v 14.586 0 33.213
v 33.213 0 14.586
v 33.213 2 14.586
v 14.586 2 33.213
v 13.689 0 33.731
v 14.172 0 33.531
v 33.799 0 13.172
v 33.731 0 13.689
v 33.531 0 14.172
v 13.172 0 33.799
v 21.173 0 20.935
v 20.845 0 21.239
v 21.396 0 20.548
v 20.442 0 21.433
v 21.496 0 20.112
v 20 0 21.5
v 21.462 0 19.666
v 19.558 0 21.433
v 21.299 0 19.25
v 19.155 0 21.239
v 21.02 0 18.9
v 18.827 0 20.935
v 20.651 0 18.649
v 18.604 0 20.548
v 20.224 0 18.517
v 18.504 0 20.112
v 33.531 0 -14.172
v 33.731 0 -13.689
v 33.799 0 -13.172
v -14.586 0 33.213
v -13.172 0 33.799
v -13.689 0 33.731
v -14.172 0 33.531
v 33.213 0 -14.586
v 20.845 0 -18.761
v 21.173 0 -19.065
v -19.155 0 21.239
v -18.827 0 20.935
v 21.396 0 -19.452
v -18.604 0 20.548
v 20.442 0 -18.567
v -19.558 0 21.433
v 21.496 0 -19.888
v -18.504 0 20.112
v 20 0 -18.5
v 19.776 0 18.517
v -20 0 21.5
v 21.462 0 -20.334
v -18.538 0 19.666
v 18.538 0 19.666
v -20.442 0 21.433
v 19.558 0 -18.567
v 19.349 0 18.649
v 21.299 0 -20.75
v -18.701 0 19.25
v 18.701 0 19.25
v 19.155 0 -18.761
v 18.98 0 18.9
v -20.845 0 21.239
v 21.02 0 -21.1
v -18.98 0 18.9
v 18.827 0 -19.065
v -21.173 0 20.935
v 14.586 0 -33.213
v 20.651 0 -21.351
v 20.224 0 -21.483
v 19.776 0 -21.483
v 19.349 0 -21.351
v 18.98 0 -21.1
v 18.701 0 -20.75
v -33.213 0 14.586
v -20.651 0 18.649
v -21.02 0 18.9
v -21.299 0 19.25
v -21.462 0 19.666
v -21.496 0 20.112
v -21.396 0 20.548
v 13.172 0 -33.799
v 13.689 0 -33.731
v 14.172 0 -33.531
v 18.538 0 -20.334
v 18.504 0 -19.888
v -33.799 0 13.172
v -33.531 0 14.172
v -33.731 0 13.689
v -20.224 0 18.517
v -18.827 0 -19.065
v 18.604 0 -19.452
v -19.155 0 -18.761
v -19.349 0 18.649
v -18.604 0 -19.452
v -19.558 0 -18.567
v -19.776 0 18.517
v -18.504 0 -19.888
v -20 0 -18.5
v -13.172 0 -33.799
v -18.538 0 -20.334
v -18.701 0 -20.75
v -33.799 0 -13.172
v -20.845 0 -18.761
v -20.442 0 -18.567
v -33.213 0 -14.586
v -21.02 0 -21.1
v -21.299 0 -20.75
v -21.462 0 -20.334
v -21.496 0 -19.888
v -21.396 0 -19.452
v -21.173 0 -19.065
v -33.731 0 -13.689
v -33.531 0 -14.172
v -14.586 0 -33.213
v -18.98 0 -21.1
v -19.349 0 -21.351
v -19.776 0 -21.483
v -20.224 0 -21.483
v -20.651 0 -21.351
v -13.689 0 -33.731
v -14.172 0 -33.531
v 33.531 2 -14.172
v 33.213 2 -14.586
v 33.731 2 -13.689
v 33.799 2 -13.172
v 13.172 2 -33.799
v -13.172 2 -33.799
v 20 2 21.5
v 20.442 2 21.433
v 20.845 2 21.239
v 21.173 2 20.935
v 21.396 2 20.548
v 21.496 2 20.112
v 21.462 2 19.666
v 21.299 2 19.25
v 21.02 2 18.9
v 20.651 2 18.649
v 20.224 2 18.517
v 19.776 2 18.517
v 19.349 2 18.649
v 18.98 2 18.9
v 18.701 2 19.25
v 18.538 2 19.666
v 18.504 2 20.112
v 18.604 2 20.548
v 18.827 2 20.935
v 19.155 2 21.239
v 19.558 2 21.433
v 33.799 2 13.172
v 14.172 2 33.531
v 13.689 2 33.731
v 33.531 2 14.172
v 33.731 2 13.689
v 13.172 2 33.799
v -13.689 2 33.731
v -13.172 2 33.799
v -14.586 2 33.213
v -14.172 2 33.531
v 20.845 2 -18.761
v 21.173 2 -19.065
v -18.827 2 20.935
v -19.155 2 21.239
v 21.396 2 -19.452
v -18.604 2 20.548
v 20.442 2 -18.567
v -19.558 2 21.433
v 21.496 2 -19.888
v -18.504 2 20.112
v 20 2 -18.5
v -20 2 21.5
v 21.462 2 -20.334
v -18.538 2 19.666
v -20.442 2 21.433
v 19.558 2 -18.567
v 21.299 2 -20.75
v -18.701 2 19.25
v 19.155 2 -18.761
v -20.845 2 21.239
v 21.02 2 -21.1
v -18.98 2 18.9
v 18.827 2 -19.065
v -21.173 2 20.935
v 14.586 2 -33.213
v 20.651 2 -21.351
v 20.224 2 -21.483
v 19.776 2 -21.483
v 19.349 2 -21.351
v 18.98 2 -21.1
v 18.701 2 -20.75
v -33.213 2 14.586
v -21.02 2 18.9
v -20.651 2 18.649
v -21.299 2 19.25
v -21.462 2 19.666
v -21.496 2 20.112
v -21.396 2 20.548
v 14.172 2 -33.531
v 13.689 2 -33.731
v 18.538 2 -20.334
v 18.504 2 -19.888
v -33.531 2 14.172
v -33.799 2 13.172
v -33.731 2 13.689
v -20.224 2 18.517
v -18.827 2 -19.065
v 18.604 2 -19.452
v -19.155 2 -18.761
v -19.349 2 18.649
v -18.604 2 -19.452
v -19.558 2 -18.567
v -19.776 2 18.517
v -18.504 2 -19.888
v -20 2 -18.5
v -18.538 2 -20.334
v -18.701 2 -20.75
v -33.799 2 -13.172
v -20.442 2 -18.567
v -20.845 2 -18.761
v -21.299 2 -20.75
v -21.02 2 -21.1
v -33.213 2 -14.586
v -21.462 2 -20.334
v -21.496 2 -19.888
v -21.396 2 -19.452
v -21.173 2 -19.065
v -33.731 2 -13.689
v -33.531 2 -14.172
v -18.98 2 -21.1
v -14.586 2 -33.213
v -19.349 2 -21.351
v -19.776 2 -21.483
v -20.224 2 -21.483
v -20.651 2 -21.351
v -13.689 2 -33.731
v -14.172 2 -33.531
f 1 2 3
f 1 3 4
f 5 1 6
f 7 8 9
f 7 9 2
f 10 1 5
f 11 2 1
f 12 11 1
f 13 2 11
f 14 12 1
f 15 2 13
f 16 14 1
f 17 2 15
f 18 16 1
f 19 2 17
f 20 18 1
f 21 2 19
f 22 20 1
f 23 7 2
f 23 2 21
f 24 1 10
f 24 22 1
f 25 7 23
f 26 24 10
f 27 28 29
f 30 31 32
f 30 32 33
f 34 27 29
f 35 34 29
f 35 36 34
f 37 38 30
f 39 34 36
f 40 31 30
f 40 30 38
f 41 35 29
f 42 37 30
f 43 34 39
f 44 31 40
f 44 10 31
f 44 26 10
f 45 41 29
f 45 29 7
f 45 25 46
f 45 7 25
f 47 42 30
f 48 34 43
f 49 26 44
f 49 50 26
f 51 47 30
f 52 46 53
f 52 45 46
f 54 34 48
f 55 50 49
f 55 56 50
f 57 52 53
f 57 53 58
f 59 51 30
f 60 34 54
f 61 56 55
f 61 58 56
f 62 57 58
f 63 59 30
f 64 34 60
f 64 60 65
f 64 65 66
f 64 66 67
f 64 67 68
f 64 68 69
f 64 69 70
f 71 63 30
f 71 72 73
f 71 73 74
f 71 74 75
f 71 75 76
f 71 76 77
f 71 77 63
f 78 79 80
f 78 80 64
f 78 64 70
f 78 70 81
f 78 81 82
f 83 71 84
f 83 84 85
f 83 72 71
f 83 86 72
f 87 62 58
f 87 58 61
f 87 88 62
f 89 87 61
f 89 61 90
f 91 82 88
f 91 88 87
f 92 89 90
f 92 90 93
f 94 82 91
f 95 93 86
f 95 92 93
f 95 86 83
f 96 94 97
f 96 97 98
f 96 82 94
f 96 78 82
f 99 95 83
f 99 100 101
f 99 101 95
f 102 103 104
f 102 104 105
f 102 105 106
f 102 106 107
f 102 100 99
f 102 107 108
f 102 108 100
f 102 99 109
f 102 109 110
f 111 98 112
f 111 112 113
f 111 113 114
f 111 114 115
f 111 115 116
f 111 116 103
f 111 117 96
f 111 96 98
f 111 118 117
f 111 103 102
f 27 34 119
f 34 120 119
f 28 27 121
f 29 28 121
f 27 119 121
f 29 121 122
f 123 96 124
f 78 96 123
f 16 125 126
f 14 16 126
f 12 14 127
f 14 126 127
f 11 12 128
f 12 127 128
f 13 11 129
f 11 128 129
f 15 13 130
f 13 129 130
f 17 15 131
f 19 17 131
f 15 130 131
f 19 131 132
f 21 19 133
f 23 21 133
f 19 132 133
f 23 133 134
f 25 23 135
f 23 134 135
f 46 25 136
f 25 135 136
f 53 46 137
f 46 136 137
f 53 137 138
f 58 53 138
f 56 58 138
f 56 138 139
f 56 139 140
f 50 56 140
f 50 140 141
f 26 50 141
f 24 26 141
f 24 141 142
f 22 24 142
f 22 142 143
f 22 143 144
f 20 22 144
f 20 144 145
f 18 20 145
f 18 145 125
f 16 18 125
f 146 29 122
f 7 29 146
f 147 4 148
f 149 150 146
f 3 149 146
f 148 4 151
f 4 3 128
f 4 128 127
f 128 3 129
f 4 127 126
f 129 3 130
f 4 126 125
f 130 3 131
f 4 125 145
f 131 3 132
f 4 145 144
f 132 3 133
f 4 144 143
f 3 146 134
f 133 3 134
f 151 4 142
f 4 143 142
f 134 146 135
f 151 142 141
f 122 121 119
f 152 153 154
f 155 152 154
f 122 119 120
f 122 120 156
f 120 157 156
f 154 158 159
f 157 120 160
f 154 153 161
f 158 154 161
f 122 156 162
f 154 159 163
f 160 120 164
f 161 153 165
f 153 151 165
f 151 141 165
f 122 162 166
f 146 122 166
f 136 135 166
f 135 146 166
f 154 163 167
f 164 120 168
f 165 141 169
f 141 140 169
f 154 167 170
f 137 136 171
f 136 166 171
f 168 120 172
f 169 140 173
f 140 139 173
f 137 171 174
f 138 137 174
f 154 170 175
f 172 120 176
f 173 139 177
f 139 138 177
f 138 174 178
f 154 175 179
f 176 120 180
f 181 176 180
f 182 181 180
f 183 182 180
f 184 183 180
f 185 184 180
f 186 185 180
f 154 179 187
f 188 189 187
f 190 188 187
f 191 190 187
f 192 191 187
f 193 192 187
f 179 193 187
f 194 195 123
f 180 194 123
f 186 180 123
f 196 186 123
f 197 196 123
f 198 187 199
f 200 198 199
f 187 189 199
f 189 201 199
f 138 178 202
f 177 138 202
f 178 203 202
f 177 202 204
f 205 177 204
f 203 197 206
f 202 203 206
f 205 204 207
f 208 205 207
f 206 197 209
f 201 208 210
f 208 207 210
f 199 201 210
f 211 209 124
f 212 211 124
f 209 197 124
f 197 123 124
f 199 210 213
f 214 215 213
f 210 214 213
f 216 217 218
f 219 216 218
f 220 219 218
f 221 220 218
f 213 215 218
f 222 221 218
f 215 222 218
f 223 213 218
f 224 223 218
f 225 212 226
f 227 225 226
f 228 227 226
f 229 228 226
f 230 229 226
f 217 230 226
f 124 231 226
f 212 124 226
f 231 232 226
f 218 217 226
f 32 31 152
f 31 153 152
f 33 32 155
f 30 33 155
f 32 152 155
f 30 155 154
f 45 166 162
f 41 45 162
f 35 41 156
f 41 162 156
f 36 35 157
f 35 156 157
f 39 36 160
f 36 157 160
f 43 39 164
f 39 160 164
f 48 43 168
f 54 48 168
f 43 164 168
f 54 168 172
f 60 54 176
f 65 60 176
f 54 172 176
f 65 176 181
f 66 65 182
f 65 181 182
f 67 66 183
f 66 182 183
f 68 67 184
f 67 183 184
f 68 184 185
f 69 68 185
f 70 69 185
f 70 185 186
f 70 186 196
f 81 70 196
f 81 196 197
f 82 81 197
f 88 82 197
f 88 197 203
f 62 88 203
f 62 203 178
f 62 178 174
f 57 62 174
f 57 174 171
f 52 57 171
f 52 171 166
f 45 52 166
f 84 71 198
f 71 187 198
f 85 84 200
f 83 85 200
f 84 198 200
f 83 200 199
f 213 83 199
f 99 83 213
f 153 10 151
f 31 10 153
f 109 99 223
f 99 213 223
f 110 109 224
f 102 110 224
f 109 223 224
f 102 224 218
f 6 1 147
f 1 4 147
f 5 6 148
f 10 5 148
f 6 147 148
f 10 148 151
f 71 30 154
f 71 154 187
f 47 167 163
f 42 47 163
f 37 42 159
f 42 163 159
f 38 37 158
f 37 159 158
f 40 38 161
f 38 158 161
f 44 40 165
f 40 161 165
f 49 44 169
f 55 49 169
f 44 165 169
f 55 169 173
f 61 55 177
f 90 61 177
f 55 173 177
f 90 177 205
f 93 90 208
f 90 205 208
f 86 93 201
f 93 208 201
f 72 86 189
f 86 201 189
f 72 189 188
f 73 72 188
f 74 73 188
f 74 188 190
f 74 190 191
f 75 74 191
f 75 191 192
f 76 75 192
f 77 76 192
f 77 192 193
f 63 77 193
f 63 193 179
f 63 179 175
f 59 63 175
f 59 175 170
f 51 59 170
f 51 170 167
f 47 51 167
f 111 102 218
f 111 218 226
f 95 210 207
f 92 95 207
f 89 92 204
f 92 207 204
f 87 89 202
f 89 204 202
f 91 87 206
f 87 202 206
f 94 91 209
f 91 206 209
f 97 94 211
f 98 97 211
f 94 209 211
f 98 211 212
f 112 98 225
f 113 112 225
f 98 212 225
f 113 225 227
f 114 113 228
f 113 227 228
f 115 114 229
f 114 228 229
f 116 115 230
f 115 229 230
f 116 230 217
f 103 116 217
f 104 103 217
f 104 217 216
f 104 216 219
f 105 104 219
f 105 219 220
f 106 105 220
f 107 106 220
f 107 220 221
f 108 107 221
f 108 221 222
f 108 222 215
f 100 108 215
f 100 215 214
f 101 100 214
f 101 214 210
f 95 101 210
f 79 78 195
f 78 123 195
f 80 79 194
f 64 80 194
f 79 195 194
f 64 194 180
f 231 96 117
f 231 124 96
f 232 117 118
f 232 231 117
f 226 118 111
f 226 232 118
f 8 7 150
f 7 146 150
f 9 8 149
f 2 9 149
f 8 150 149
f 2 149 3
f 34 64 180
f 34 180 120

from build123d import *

# Parameters (mm, degrees)
BOSS_EXTRUDE1_DEPTH = 2
FILLET1_R           = 2
SKETCH2_R           = 1.5
CUT_EXTRUDE1_DEPTH  = 10


with BuildPart() as part:
    # Sketch1 → Boss-Extrude1 (new body)
    with BuildSketch(Plane(origin=(0, 0, 0), x_dir=(1, 0, 0), z_dir=(0, 1, 0))):
        Polygon((-14, 33.798989873), (14, 33.798989873), (33.798989873, 14), (33.798989873, -14), (14, -33.798989873), (-14, -33.798989873), (-33.798989873, -14), (-33.798989873, 14), align=None)
    extrude(amount=BOSS_EXTRUDE1_DEPTH)

    # Fillet1
    fillet1_edges = [part.edges().sort_by_distance(p)[0] for p in [
        (-14, 1, -33.798989873),
        (14, 1, -33.798989873),
        (33.798989873, 1, -14),
        (33.798989873, 1, 14),
        (14, 1, 33.798989873),
        (-14, 1, 33.798989873),
        (-33.798989873, 1, 14),
        (-33.798989873, 1, -14),
    ]]
    fillet(fillet1_edges, radius=FILLET1_R)

    # Sketch2 → Cut-Extrude1 (cut)
    with BuildSketch(Plane(origin=(0, 2, 0), x_dir=(1, 0, 0), z_dir=(0, 1, 0))):
        with Locations(Location((-20, 20, 0), (0, 0, 270))):
            Circle(SKETCH2_R)
        with Locations(Location((20, 20, 0), (0, 0, 270))):
            Circle(SKETCH2_R)
        with Locations(Location((20, -20, 0), (0, 0, 270))):
            Circle(SKETCH2_R)
        with Locations(Location((-20, -20, 0), (0, 0, 270))):
            Circle(SKETCH2_R)
    extrude(amount=-CUT_EXTRUDE1_DEPTH, mode=Mode.SUBTRACT)


solid = part.part
